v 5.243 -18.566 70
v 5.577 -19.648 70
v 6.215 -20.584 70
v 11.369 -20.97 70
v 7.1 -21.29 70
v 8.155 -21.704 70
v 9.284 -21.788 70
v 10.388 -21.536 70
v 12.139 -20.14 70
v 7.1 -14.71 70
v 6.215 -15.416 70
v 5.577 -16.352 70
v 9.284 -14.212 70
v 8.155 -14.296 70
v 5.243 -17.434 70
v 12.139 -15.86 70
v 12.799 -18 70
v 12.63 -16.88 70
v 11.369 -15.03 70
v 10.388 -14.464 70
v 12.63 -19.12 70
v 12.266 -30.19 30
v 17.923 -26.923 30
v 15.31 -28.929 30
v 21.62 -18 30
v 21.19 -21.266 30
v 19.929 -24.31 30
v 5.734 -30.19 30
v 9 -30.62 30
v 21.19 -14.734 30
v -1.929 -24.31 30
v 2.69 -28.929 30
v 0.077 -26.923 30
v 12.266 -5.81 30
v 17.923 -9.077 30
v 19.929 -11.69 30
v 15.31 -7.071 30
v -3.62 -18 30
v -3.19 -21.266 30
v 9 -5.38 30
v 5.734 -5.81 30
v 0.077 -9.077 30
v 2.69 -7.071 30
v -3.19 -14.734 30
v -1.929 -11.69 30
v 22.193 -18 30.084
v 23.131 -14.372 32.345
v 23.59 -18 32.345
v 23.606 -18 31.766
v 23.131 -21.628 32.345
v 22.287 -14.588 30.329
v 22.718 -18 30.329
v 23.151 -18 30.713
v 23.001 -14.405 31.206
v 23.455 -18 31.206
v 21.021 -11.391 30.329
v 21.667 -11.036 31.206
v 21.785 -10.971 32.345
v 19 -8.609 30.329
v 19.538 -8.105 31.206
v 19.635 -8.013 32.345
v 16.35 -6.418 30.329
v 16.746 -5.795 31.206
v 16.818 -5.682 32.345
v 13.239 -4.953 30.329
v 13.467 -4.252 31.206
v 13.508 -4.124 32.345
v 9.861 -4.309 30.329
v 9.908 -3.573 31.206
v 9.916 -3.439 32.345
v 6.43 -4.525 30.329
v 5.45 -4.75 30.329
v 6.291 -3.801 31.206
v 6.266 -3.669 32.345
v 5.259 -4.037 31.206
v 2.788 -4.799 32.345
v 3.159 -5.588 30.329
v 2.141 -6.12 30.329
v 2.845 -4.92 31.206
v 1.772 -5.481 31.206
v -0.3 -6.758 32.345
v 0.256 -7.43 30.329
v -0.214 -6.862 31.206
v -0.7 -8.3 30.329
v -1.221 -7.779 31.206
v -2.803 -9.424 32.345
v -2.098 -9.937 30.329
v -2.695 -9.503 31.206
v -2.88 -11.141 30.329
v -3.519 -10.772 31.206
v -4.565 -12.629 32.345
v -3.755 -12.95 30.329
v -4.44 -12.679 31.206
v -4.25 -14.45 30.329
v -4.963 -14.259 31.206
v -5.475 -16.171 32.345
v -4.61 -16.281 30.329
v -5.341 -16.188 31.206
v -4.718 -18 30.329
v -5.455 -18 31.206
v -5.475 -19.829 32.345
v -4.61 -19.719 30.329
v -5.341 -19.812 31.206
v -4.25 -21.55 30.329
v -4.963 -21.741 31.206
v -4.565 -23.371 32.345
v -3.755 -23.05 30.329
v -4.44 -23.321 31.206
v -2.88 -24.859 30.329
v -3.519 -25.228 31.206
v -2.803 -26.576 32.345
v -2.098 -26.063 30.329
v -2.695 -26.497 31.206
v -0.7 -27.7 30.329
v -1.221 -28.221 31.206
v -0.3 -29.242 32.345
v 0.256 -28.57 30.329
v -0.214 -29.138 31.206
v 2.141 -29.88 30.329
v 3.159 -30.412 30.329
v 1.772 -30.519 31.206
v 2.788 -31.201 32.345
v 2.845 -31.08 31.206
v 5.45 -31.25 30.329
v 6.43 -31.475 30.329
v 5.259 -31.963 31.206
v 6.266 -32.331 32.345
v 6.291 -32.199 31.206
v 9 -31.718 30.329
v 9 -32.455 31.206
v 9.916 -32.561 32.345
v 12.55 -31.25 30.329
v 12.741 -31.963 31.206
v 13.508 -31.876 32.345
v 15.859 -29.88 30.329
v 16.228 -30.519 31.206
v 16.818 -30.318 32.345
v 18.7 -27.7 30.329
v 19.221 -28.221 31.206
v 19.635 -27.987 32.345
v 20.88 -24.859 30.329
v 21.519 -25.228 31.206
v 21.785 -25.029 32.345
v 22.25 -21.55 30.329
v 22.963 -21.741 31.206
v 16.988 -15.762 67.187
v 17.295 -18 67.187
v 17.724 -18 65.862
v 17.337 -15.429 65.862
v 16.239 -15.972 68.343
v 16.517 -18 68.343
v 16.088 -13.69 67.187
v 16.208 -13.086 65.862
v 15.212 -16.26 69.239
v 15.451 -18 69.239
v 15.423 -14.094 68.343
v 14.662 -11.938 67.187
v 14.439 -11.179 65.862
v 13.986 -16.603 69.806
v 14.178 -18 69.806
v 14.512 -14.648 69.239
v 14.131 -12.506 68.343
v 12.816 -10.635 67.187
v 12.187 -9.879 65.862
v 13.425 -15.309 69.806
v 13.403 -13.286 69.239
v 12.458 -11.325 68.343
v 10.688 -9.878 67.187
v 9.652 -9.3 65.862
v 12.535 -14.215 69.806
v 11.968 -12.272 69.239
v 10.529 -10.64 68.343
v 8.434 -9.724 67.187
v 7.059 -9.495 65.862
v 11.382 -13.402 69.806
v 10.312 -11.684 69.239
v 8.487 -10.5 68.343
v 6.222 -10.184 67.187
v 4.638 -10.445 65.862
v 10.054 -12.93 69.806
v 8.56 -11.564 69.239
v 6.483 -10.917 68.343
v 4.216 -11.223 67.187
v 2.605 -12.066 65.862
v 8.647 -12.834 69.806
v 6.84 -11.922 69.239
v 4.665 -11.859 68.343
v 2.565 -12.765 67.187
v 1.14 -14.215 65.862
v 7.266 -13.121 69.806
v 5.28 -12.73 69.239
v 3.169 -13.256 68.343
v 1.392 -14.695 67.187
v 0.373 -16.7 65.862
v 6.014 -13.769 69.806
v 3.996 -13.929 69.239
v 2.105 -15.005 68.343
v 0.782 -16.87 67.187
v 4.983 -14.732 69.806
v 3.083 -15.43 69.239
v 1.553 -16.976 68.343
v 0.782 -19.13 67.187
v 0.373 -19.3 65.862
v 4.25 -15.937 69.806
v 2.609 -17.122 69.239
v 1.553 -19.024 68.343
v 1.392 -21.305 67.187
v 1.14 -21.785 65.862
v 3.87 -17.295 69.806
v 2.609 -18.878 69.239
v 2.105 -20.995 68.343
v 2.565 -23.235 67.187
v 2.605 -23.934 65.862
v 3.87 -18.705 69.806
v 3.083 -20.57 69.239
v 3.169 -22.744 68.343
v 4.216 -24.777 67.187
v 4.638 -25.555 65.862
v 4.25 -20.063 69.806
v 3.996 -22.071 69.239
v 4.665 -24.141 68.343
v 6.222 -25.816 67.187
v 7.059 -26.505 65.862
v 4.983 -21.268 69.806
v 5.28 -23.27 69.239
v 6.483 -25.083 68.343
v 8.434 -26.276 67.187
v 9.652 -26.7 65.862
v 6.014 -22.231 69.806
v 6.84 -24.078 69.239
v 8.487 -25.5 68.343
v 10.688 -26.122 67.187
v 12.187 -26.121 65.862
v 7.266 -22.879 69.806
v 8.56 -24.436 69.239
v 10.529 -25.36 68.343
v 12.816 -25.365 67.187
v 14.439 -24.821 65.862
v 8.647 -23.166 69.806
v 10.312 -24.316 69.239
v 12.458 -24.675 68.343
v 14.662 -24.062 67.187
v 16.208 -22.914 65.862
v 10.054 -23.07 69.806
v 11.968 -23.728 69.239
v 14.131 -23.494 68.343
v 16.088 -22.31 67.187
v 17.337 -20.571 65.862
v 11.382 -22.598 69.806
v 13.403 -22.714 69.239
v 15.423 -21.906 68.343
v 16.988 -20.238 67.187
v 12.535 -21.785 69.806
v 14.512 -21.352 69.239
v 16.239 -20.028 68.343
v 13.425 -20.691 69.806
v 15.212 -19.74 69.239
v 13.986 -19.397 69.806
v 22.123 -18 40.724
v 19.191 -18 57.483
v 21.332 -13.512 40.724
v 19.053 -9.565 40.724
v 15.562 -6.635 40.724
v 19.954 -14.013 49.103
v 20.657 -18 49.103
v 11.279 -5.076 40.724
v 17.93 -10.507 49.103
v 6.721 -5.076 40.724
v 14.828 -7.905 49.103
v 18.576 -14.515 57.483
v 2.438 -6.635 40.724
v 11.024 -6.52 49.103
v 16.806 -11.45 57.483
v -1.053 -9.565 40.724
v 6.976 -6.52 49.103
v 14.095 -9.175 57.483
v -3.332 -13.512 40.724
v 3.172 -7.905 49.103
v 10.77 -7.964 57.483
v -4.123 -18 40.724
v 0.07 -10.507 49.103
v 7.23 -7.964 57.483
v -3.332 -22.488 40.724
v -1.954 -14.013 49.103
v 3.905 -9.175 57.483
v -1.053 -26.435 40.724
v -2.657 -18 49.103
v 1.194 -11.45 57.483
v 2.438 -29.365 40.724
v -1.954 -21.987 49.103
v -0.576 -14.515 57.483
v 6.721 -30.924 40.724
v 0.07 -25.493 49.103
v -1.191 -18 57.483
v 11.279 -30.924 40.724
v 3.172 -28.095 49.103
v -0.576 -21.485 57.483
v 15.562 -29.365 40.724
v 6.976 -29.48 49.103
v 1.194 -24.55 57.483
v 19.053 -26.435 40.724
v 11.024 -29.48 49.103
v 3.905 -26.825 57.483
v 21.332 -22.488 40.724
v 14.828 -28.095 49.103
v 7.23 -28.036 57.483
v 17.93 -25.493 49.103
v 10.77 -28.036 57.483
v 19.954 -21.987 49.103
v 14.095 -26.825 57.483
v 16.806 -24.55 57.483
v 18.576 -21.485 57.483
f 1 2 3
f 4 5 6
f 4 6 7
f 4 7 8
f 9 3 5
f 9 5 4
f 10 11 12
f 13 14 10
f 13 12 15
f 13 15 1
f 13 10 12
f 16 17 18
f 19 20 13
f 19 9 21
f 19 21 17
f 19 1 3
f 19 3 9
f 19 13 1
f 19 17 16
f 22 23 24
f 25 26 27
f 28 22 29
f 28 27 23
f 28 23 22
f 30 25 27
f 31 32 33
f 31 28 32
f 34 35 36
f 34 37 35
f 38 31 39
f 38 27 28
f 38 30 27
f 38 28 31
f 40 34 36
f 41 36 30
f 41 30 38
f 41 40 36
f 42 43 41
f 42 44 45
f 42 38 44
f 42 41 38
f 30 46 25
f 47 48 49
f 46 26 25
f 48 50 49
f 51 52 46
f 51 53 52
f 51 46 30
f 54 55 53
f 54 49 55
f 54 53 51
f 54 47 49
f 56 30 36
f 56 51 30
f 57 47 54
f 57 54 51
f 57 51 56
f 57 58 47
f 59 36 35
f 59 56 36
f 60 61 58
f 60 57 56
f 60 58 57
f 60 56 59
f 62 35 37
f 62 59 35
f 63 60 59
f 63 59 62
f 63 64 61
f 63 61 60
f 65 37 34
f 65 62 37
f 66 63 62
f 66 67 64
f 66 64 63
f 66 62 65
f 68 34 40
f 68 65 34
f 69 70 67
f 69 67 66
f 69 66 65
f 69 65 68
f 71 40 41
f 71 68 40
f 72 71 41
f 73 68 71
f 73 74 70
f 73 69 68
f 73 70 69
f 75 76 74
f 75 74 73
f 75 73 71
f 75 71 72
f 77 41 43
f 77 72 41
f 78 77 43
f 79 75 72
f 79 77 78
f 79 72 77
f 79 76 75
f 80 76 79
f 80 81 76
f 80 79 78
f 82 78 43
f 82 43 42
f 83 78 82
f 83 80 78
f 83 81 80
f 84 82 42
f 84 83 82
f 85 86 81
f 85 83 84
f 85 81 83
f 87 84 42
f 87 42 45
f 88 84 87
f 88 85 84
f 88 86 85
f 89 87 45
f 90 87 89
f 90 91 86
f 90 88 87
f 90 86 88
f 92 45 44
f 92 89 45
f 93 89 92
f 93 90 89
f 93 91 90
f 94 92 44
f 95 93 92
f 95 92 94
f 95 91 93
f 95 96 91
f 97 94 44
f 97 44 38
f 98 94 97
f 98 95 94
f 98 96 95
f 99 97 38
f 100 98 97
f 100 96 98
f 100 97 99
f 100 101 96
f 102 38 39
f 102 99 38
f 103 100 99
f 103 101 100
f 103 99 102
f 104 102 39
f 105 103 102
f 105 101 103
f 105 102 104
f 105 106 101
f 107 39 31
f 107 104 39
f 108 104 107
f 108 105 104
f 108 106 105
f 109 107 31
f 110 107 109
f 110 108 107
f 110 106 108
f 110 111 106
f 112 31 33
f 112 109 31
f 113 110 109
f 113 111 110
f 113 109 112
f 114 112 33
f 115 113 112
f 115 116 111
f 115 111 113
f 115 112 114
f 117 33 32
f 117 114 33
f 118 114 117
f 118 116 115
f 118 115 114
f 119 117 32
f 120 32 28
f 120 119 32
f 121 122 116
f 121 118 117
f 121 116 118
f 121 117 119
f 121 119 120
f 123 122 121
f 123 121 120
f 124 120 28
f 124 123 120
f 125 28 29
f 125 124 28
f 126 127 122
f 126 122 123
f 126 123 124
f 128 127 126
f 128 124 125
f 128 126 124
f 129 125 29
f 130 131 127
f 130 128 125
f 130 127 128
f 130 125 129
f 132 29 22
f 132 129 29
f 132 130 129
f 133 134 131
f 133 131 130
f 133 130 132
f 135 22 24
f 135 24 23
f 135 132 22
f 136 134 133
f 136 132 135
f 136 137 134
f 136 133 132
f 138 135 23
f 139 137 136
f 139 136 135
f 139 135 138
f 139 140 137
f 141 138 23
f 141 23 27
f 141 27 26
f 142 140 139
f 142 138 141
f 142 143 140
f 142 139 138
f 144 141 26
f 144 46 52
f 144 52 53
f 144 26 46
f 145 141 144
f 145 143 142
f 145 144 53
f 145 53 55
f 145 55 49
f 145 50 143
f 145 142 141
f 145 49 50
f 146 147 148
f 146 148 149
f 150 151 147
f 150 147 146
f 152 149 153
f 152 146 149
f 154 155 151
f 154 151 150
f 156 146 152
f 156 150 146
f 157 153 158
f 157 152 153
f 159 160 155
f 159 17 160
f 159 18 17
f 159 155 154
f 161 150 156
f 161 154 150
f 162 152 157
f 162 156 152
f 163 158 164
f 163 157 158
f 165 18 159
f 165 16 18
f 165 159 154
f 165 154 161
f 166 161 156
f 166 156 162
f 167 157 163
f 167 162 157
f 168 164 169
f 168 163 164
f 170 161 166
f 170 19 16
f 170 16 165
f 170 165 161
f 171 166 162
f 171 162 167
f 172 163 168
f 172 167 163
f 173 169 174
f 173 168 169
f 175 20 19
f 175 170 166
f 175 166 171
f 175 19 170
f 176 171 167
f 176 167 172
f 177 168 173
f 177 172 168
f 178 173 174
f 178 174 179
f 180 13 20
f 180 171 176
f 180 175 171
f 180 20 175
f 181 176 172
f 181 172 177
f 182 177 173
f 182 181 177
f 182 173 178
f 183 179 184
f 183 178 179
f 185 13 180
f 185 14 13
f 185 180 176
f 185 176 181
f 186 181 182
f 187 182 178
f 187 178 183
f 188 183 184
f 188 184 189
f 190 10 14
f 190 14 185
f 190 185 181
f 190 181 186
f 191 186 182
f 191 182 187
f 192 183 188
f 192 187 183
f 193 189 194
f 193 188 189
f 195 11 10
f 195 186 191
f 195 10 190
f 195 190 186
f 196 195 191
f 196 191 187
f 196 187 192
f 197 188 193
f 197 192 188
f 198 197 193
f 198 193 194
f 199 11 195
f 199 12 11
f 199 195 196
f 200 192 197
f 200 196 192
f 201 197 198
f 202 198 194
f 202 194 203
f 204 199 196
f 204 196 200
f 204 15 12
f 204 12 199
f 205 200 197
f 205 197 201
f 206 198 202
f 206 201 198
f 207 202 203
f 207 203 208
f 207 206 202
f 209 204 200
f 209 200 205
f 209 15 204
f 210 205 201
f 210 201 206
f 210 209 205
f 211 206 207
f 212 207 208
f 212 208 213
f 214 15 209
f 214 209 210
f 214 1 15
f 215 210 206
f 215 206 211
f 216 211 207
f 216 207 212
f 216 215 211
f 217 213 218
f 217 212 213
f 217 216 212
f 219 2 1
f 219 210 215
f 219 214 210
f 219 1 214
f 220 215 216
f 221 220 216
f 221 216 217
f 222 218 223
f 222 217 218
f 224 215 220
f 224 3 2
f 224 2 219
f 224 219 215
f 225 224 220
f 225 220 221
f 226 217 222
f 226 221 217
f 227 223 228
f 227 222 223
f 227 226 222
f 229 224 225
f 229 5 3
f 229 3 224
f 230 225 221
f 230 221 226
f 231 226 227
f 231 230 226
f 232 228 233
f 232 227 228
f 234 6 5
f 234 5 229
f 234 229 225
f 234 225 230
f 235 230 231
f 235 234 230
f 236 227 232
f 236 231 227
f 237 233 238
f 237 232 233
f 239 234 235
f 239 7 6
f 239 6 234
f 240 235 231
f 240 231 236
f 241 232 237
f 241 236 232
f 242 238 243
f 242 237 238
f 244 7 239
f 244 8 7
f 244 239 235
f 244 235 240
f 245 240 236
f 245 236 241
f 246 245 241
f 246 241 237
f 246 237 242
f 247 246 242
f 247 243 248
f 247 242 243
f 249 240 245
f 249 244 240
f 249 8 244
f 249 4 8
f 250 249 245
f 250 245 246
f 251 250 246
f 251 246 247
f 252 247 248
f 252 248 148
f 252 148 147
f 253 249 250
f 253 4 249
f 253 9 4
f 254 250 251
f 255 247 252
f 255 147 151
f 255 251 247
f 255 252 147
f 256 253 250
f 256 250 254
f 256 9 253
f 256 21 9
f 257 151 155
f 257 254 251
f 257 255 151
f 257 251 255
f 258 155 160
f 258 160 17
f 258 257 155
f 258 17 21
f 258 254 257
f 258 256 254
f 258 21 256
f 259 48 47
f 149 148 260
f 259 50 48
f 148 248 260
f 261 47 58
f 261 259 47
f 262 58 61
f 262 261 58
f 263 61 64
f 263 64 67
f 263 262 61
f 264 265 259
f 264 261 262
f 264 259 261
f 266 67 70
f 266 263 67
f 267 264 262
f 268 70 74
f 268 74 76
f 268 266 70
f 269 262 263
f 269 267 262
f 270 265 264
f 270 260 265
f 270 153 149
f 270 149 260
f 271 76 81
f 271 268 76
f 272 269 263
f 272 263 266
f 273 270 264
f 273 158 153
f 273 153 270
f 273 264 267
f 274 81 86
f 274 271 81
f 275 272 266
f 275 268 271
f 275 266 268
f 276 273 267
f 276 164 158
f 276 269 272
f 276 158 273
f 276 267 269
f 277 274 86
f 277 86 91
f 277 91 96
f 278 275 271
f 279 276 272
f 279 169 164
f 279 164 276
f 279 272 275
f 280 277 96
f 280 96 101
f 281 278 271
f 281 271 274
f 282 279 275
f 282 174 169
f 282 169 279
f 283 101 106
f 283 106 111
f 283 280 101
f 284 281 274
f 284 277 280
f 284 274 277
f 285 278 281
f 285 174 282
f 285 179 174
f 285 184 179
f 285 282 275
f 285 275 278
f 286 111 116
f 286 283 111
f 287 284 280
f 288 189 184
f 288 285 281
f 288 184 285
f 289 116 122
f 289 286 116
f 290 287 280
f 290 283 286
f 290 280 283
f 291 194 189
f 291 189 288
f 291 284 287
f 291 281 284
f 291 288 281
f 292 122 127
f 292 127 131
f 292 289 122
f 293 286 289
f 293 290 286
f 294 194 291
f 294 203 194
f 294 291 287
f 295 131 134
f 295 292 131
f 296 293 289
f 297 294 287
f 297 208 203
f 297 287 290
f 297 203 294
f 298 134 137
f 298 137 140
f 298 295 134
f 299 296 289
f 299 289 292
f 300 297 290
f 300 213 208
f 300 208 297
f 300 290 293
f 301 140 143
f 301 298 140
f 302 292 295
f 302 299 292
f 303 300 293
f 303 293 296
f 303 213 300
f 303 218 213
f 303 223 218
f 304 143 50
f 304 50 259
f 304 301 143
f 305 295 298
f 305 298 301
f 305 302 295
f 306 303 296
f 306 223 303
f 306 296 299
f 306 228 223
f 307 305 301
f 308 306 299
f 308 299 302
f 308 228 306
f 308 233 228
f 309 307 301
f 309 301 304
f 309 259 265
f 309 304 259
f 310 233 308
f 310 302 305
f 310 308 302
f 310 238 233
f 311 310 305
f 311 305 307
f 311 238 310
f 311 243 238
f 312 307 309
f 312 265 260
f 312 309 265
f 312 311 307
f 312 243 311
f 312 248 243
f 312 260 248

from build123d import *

# Parameters (mm, degrees)
FILLET014_R = 2
FILLET015_R = 5


with BuildPart() as part:
    # Cone014 → Cone014 (revolve)
    with BuildSketch(Plane(origin=(10, -18, 16), x_dir=(1, 0, 0), z_dir=(0, -1, 0))):
        Polygon((0, 0), (15, 0), (8, 40), (0, 40), align=None)
    revolve(axis=Axis((10, -18, 16), (0, 0, 1)))

    # Fillet014
    fillet014_edges = [part.edges().sort_by_distance(p)[0] for p in [
        (-5, -18, 16),
    ]]
    fillet(fillet014_edges, radius=FILLET014_R)


with BuildPart() as part_1:
    # Fillet014 placement: moved
    add(part.part.moved(Location((0, 0, 14))))

    # Fillet015
    fillet015_edges = [part_1.edges().sort_by_distance(p)[0] for p in [
        (2, -18, 70),
    ]]
    fillet(fillet015_edges, radius=FILLET015_R)


with BuildPart() as part_2:
    # Fillet015 placement: moved
    add(part_1.part.moved(Location((-1, 0, 0))))


solid = part_2.part
